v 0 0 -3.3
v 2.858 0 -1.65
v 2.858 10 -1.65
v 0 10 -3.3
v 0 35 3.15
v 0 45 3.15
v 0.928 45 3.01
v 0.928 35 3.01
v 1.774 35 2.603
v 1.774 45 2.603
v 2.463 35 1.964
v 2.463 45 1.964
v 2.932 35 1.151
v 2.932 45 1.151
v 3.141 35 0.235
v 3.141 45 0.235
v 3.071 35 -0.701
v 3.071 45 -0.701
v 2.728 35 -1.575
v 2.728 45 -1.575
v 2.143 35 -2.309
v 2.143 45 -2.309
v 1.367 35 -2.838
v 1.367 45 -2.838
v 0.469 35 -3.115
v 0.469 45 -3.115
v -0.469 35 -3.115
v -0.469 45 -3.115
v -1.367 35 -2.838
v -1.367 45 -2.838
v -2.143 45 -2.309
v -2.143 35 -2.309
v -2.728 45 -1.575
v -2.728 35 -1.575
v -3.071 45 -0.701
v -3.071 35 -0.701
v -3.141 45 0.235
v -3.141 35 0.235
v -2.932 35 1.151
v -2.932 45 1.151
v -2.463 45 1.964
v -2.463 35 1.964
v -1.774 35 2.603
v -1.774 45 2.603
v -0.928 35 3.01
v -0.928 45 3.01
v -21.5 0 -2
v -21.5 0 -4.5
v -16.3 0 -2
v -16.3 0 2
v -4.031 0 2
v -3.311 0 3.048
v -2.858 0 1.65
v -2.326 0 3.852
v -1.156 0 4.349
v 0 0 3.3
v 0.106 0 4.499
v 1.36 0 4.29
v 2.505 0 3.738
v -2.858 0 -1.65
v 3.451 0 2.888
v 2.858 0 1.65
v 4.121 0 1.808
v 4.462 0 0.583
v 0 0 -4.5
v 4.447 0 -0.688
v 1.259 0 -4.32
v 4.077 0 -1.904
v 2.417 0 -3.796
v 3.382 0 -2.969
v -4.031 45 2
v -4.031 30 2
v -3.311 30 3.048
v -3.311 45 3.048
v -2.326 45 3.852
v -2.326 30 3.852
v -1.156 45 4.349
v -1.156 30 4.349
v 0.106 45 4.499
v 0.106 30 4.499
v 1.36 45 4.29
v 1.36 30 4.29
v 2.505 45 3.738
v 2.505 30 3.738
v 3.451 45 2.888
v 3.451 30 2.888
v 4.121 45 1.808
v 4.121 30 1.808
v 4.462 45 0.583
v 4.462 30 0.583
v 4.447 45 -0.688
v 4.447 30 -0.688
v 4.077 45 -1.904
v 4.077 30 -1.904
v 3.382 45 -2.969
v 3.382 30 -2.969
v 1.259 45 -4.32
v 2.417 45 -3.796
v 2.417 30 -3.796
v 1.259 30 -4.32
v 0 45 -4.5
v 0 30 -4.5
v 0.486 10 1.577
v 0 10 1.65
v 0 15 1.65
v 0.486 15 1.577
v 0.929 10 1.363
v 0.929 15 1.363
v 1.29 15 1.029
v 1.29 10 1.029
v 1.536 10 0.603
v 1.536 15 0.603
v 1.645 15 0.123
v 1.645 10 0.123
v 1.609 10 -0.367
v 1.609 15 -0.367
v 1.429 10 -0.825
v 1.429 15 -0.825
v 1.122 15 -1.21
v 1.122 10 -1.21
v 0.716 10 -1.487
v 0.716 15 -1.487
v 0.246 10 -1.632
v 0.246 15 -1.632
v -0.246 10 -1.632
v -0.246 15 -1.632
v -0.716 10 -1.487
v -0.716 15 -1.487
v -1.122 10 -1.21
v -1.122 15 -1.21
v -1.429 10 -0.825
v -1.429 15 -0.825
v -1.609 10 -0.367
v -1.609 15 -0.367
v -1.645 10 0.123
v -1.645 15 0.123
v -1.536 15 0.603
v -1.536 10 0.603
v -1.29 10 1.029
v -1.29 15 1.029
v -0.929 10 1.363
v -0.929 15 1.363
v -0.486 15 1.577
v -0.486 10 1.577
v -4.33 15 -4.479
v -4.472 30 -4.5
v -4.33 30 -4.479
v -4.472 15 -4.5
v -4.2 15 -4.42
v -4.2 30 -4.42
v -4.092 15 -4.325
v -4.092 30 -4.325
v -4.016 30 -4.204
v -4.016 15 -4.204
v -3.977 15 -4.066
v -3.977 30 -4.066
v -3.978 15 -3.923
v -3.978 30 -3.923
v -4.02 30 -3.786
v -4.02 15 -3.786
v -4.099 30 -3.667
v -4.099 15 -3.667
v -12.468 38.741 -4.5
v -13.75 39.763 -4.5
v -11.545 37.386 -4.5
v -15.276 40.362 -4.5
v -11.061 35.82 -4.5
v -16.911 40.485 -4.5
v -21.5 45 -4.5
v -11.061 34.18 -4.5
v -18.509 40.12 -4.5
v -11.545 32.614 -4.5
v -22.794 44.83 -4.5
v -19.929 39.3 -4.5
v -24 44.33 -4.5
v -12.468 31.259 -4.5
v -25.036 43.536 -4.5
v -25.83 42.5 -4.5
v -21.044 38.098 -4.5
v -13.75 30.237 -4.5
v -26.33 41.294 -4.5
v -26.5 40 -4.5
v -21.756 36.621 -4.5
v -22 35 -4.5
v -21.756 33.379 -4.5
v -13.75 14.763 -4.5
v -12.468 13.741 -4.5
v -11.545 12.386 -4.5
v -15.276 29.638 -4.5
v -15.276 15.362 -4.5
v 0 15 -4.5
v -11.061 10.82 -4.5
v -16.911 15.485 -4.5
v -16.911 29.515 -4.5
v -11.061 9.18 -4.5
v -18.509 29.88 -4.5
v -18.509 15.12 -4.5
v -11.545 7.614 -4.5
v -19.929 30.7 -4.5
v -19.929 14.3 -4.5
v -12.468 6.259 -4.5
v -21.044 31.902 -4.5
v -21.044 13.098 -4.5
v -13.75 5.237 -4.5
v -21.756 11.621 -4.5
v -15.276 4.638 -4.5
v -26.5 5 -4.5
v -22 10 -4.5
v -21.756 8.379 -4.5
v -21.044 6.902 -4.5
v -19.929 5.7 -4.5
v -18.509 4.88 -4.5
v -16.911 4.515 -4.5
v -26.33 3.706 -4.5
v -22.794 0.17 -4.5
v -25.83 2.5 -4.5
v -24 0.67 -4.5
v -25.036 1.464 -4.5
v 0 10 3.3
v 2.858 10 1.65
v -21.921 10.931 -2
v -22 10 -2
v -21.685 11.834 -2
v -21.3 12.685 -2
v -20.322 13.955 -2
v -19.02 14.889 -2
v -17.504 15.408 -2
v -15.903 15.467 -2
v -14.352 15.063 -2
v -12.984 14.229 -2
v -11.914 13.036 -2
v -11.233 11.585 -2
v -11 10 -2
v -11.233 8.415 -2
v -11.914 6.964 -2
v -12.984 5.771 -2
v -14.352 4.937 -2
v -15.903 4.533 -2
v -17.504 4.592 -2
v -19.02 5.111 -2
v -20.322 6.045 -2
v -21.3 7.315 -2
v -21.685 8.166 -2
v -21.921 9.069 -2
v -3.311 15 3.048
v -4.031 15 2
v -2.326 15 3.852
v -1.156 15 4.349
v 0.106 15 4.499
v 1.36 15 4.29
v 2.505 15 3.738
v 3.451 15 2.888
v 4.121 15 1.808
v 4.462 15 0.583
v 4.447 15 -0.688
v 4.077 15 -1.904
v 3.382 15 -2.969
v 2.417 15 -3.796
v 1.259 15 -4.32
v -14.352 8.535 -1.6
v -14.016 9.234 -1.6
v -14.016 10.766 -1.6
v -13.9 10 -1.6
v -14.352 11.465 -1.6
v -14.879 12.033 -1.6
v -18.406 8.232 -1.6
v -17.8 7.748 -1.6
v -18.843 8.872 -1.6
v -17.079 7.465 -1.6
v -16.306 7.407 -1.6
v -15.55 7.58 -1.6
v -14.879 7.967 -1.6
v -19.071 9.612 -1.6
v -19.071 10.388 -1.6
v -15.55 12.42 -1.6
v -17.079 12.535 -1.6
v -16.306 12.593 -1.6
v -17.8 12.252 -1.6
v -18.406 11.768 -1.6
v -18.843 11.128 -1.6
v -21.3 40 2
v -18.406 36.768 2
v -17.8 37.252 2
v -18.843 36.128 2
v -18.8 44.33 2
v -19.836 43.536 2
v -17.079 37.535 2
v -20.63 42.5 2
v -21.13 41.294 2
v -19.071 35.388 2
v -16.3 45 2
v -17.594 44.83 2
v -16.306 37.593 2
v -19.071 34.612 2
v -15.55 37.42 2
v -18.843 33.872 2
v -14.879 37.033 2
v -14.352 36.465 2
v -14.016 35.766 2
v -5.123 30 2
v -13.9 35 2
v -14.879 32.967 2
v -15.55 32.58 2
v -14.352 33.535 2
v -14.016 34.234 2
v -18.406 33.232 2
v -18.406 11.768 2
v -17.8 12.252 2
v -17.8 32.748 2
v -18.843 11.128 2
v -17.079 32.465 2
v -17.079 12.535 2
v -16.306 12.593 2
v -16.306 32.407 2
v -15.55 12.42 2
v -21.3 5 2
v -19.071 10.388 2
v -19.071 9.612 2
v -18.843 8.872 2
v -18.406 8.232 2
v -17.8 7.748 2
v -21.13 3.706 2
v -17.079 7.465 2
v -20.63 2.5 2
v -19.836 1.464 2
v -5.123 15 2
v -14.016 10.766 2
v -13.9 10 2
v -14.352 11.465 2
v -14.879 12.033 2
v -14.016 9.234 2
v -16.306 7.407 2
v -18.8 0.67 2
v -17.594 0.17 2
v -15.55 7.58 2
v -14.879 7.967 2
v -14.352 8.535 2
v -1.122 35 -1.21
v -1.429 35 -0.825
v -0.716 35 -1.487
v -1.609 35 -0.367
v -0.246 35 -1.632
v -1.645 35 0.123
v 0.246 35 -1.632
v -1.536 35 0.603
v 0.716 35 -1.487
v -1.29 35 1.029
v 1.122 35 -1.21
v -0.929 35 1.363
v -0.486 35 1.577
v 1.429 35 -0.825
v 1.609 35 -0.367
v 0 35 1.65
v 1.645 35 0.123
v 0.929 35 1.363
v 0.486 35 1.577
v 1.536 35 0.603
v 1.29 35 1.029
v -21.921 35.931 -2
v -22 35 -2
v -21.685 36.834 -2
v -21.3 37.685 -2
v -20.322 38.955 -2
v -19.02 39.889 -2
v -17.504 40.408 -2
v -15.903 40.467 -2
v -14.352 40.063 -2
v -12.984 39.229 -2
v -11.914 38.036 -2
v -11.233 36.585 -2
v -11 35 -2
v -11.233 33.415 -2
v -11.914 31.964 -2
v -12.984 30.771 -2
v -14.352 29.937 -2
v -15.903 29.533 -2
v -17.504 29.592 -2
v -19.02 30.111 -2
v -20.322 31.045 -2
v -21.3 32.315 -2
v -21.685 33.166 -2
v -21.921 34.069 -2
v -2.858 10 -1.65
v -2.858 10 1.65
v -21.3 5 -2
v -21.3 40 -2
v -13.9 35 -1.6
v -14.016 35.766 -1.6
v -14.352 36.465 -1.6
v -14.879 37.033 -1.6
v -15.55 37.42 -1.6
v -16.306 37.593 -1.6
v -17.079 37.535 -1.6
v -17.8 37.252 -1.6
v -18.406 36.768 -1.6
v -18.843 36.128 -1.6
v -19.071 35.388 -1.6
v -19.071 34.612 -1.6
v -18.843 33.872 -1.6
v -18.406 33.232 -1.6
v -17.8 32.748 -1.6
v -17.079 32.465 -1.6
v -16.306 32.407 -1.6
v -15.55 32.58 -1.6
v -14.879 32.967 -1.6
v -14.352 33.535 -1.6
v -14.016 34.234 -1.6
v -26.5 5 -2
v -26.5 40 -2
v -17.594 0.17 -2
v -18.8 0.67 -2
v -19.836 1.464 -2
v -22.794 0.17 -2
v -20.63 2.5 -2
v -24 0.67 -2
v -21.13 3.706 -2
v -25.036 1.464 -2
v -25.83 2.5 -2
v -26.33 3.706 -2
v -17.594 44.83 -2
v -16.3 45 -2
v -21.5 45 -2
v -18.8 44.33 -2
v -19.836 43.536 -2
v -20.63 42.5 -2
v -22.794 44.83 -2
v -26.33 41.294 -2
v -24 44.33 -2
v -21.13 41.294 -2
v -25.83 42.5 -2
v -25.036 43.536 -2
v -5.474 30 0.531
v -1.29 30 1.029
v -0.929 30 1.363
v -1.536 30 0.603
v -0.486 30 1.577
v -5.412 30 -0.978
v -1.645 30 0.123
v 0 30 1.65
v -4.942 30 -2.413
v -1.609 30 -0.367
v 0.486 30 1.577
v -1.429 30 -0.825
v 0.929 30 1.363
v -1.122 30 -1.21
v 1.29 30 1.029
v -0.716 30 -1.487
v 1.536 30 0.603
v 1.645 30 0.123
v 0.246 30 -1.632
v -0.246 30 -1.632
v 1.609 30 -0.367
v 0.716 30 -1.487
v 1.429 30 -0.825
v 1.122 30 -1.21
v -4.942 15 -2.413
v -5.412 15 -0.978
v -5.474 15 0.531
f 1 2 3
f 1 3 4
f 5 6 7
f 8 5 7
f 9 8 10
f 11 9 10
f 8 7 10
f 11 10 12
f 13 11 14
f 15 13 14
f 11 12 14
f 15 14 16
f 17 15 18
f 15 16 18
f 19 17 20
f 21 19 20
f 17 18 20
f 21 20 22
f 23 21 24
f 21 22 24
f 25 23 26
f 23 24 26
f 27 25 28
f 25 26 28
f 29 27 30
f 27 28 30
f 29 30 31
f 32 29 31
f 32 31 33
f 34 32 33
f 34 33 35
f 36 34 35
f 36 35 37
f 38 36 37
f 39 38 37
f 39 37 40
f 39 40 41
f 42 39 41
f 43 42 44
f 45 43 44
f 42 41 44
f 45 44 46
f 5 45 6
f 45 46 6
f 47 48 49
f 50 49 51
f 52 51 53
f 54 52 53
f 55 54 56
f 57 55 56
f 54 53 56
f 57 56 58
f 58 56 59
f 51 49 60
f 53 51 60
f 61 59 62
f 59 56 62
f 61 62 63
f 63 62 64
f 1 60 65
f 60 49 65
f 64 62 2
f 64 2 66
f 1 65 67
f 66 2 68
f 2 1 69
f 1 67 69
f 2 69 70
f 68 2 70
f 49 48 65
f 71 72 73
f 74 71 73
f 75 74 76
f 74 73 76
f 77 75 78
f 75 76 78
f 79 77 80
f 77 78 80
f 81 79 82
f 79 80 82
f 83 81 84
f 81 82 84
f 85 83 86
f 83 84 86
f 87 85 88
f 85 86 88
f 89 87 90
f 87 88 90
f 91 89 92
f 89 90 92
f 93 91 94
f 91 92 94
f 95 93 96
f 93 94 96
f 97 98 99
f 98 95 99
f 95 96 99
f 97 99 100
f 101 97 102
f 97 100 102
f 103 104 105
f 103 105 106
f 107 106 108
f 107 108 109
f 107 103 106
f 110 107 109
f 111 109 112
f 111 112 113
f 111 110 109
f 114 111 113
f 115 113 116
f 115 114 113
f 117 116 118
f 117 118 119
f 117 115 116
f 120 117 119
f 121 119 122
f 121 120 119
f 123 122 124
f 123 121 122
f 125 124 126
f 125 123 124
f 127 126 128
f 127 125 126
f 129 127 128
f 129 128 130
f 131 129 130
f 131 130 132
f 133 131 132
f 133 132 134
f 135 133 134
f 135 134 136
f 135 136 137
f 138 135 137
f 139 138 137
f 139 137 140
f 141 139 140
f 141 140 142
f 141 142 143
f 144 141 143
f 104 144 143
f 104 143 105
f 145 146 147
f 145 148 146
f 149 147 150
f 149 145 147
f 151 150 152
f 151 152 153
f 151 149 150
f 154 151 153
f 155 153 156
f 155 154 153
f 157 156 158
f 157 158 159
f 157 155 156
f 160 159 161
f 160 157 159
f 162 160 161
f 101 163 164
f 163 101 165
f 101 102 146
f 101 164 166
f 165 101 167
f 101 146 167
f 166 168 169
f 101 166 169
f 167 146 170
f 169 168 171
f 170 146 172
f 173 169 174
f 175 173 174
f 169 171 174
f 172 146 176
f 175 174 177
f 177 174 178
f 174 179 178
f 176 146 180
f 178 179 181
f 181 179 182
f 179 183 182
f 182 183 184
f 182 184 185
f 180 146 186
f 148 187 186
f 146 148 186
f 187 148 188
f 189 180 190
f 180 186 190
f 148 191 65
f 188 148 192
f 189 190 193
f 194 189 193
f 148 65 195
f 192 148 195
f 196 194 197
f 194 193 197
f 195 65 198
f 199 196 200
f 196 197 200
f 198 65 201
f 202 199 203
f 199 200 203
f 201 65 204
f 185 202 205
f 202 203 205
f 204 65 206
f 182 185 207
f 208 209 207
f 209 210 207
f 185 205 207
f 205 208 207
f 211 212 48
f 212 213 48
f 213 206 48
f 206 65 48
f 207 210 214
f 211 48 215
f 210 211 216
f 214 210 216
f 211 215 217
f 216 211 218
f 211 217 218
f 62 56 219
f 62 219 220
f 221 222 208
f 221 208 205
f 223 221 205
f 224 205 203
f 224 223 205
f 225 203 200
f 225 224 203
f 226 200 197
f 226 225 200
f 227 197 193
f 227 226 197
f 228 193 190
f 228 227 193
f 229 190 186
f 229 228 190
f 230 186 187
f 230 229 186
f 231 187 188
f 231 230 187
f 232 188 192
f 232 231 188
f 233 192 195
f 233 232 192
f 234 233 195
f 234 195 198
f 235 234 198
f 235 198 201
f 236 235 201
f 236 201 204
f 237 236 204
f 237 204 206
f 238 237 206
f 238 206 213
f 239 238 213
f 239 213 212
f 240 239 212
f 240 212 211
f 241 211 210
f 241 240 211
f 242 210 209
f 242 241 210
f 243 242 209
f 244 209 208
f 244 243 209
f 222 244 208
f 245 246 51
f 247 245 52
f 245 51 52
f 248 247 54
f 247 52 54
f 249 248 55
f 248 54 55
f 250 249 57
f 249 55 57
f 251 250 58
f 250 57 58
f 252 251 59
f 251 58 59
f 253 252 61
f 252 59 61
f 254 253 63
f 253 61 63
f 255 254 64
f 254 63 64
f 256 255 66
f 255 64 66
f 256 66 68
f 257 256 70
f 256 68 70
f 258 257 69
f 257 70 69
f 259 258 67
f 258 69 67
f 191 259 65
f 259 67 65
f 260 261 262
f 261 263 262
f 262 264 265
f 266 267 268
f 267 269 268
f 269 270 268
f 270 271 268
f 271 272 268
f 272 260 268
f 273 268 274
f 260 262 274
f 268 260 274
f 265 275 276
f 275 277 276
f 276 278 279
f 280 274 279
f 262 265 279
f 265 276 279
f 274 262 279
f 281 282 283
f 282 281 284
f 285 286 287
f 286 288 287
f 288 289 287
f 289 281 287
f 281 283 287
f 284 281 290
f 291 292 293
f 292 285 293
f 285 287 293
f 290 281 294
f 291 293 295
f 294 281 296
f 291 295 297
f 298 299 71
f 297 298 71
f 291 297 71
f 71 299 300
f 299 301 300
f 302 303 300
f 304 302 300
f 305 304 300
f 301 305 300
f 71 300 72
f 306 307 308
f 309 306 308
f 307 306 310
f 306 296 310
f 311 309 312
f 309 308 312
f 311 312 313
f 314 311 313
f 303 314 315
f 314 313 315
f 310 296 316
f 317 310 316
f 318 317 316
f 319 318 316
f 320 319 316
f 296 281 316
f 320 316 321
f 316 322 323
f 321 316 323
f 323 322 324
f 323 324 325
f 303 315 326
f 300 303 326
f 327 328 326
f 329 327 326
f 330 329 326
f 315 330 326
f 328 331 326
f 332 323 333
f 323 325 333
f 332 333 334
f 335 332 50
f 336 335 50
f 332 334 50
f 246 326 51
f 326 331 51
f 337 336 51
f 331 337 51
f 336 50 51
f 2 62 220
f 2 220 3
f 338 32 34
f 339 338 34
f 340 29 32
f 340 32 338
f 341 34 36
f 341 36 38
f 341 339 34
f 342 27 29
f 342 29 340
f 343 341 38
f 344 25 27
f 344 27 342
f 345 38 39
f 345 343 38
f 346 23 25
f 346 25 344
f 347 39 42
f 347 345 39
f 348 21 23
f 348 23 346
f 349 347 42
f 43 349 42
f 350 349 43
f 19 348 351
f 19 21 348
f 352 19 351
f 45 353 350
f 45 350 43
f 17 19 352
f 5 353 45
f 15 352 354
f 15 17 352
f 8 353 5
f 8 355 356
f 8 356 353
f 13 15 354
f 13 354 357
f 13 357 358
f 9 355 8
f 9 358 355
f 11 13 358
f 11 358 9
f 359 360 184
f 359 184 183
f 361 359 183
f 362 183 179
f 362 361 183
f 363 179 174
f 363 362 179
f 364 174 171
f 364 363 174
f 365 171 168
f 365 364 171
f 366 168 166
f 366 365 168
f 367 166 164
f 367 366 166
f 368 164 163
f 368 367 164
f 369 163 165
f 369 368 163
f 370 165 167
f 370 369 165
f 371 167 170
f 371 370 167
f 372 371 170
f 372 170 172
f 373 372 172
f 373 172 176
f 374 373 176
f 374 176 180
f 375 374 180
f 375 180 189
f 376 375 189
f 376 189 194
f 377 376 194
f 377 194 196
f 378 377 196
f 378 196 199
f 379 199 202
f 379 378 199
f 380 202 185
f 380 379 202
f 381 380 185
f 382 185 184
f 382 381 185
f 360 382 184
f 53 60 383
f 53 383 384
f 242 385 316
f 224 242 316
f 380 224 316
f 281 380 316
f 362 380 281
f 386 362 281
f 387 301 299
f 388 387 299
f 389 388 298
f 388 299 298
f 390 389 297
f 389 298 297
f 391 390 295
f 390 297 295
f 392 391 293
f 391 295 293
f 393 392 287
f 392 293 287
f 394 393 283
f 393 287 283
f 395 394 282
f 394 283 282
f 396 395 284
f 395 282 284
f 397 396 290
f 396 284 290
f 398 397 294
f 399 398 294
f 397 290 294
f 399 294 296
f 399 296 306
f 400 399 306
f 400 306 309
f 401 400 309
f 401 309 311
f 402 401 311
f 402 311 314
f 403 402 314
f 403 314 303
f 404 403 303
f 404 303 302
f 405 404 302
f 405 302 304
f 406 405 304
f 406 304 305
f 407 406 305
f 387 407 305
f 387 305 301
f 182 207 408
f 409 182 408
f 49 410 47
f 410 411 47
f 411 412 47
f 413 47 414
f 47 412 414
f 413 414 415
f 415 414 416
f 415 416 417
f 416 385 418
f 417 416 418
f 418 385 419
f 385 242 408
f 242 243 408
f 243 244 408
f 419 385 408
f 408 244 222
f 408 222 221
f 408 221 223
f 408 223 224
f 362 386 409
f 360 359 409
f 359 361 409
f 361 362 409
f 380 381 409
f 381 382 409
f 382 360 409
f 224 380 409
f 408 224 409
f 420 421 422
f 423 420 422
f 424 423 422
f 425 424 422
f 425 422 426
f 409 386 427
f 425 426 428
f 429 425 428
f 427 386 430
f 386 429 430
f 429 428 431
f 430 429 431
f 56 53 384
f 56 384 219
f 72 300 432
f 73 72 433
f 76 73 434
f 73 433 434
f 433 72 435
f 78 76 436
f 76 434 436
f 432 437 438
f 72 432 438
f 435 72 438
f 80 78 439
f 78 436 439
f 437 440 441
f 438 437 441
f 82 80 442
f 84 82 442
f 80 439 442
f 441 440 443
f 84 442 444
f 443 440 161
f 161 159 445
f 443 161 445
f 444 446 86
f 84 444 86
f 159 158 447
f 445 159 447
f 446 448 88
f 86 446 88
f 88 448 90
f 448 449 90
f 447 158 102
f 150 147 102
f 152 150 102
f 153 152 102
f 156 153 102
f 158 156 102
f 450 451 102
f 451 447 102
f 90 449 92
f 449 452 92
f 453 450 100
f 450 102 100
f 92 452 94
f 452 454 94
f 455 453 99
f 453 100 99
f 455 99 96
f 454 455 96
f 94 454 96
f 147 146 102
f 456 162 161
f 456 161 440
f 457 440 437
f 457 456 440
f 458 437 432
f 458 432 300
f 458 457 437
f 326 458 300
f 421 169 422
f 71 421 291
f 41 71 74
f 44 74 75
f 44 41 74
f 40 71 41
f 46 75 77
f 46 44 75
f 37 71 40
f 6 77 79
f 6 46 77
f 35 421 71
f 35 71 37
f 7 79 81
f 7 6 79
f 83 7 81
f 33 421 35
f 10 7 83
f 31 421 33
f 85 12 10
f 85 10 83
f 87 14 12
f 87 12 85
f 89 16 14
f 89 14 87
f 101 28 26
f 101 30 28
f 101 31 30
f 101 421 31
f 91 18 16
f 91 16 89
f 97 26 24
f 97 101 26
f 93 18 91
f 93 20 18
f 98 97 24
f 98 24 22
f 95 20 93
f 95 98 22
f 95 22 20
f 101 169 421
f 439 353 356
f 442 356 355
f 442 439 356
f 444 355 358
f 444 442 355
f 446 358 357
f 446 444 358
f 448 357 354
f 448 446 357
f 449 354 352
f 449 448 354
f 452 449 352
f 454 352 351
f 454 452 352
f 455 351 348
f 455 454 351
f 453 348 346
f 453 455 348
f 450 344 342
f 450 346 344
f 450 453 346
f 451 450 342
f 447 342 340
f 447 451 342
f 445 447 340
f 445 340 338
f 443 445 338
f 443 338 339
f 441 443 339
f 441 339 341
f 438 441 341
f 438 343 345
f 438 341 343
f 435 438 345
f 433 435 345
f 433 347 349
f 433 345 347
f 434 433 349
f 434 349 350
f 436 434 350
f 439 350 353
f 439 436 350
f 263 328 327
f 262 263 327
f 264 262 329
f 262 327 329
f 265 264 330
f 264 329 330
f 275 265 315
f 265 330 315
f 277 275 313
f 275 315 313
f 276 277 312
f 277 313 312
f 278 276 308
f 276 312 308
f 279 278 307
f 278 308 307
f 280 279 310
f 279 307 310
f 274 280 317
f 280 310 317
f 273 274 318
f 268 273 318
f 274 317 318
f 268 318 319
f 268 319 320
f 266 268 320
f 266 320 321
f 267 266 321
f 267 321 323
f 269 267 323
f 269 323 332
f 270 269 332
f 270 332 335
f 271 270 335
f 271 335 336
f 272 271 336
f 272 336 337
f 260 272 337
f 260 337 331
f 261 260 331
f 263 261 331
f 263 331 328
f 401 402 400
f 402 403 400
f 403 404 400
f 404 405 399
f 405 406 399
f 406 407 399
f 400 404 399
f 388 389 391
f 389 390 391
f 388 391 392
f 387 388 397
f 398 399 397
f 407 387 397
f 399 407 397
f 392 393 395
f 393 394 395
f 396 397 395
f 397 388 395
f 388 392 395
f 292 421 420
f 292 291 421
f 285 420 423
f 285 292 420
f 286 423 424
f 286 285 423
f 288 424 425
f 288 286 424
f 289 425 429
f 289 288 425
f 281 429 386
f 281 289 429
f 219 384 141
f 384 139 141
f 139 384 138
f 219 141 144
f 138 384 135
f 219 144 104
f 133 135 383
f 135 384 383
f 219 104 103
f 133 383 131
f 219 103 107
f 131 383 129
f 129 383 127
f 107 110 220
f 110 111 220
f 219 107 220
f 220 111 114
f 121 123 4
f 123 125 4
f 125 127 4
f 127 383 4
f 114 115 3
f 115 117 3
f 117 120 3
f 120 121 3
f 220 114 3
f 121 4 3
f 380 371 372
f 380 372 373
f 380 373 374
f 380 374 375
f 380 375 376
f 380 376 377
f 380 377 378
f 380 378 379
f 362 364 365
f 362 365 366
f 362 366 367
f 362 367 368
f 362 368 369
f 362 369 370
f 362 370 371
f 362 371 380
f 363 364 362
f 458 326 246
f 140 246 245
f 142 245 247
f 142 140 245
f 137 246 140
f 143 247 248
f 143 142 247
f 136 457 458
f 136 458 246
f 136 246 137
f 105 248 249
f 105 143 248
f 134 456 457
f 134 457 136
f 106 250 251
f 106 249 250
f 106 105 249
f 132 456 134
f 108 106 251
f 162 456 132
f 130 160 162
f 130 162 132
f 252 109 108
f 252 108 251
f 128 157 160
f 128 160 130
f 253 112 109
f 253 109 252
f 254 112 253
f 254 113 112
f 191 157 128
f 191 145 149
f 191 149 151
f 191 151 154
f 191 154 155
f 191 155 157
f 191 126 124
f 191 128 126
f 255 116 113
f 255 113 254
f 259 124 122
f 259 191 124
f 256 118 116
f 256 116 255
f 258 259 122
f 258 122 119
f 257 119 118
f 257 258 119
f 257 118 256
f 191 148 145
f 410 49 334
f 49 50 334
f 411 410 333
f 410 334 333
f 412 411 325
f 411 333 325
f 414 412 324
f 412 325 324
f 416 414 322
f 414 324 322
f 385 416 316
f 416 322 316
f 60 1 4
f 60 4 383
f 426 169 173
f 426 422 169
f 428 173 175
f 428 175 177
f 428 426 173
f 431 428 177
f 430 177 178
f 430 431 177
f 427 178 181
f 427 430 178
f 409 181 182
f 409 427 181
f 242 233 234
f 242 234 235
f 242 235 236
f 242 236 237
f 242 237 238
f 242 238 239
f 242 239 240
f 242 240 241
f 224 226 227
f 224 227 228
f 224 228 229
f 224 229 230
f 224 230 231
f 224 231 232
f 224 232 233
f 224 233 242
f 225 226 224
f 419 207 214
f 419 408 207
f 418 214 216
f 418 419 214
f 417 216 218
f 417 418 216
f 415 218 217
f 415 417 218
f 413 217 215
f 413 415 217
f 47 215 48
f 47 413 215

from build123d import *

# Parameters (mm, degrees)
BOSS_EXTRUDE1_DEPTH = 45
BOSS_EXTRUDE2_START = 30
SKETCH1_3_R         = 4.5
SKETCH1_3_R_2       = 1.65
BOSS_EXTRUDE2_DEPTH = 15
SKETCH1_4_R         = 4.5
SKETCH1_4_R_2       = 1.65
BOSS_EXTRUDE3_DEPTH = 15
SKETCH5_R           = 5.5
CUT_EXTRUDE1_DEPTH  = 15
SKETCH6_R           = 2.6
CUT_EXTRUDE2_DEPTH  = 15
FILLET1_R           = 0.5
CUT_EXTRUDE3_START  = -2.5
SKETCH7_R           = 5.5
CUT_EXTRUDE3_DEPTH  = 13
SKETCH1_5_R         = 1.65
CUT_EXTRUDE4_DEPTH  = 10
SKETCH9_R           = 3.15
CUT_EXTRUDE5_DEPTH  = 10
SKETCH8_R           = 3.001117943
SKETCH8_R_2         = 3.734433125
BOSS_EXTRUDE5_DEPTH = 0.4
CUT_EXTRUDE6_START  = -2.5
SKETCH10_W          = 5.2
SKETCH10_H          = 45
CUT_EXTRUDE6_DEPTH  = 10
FILLET2_R           = 5


with BuildPart() as part:
    # Sketch1 → Boss-Extrude1 (new body)
    with BuildSketch(Plane(origin=(0, 0, 0), x_dir=(1, 0, 0), z_dir=(0, 1, 0))):
        with BuildLine():
            Line((-26.5, 4.5), (-26.5, -2))
            Line((-26.5, -2), (-4.031128874, -2))
            ThreePointArc((-4.031128874, -2), (-3.824264635, 2.371708245), (0, 4.5))
            Line((0, 4.5), (-26.5, 4.5))
        make_face()
    extrude(amount=BOSS_EXTRUDE1_DEPTH)

    # Sketch1<3> → Boss-Extrude2 (add)
    with BuildSketch(Plane(origin=(0, 0, 0), x_dir=(1, 0, 0), z_dir=(0, 1, 0)).offset(BOSS_EXTRUDE2_START)):
        Circle(SKETCH1_3_R)
        with Locations(Location((0, 0, 0), (0, 0, 270))):
            Circle(SKETCH1_3_R_2, mode=Mode.SUBTRACT)
    extrude(amount=BOSS_EXTRUDE2_DEPTH)

    # Sketch1<4> → Boss-Extrude3 (add)
    # profile 1 of 2: a face of its own
    with BuildSketch(Plane(origin=(0, 0, 0), x_dir=(1, 0, 0), z_dir=(0, 1, 0))):
        Circle(SKETCH1_4_R)
        Polygon((-2.857883832, -1.65), (0, -3.3), (2.857883832, -1.65), (2.857883832, 1.65), (0, 3.3), (-2.857883832, 1.65), align=None, mode=Mode.SUBTRACT)
    # profile 2 of 2: a face of its own
    with BuildSketch(Plane(origin=(0, 0, 0), x_dir=(1, 0, 0), z_dir=(0, 1, 0))):
        Polygon((-2.857883832, 1.65), (-2.857883832, -1.65), (0, -3.3), (2.857883832, -1.65), (2.857883832, 1.65), (0, 3.3), align=None)
        with Locations(Location((0, 0, 0), (0, 0, 270))):
            Circle(SKETCH1_4_R_2, mode=Mode.SUBTRACT)
    extrude(amount=BOSS_EXTRUDE3_DEPTH)

    # Sketch5 → Cut-Extrude1 (cut)
    with BuildSketch(Plane(origin=(0, 15, 0), x_dir=(1, 0, 0), z_dir=(0, 1, 0))):
        Circle(SKETCH5_R)
    extrude(amount=CUT_EXTRUDE1_DEPTH, mode=Mode.SUBTRACT)

    # Sketch6 → Cut-Extrude2 (cut)
    with BuildSketch(Plane.XY.offset(2)):
        with Locations((-16.5, 35)):
            Circle(SKETCH6_R)
        with Locations((-16.5, 10)):
            Circle(SKETCH6_R)
    extrude(amount=-CUT_EXTRUDE2_DEPTH, mode=Mode.SUBTRACT)

    # Fillet1
    fillet1_edges = [part.edges().sort_by_distance(p)[0] for p in [
        (-3.16227766, 22.5, -4.5),
    ]]
    fillet(fillet1_edges, radius=FILLET1_R)

    # Sketch7 → Cut-Extrude3 (cut)
    with BuildSketch(Plane(origin=(0, 0, -4.5), x_dir=(-1, 0, 0), z_dir=(0, 0, -1)).offset(CUT_EXTRUDE3_START)):
        with Locations((16.5, 35)):
            Circle(SKETCH7_R)
        with Locations((16.5, 10)):
            Circle(SKETCH7_R)
    extrude(amount=CUT_EXTRUDE3_DEPTH, mode=Mode.SUBTRACT)

    # Sketch1<5> → Cut-Extrude4 (cut)
    with BuildSketch(Plane(origin=(0, 0, 0), x_dir=(1, 0, 0), z_dir=(0, 1, 0))):
        Polygon((-2.857883832, 1.65), (-2.857883832, -1.65), (0, -3.3), (2.857883832, -1.65), (2.857883832, 1.65), (0, 3.3), align=None)
        with Locations(Location((0, 0, 0), (0, 0, 270))):
            Circle(SKETCH1_5_R, mode=Mode.SUBTRACT)
    extrude(amount=CUT_EXTRUDE4_DEPTH, mode=Mode.SUBTRACT)

    # Sketch9 → Cut-Extrude5 (cut)
    with BuildSketch(Plane(origin=(0, 45, 0), x_dir=(1, 0, 0), z_dir=(0, 1, 0))):
        with Locations(Location((0, 0, 0), (0, 0, 270))):
            Circle(SKETCH9_R)
    extrude(amount=-CUT_EXTRUDE5_DEPTH, mode=Mode.SUBTRACT)

    # Sketch8 → Boss-Extrude5 (add)
    with BuildSketch(Plane(origin=(0, 0, -2), x_dir=(-1, 0, 0), z_dir=(0, 0, -1))):
        with Locations((16.5, 35)):
            Circle(SKETCH8_R)
        with Locations((16.5, 10)):
            Circle(SKETCH8_R_2)
    extrude(amount=-BOSS_EXTRUDE5_DEPTH)

    # Sketch10 → Cut-Extrude6 (cut)
    with BuildSketch(Plane(origin=(0, 0, -4.5), x_dir=(-1, 0, 0), z_dir=(0, 0, -1)).offset(CUT_EXTRUDE6_START)):
        with Locations((23.9, 22.5)):
            Rectangle(SKETCH10_W, SKETCH10_H)
    extrude(amount=-CUT_EXTRUDE6_DEPTH, mode=Mode.SUBTRACT)

    # Fillet2
    fillet2_edges = [part.edges().sort_by_distance(p)[0] for p in [
        (-26.5, 45, -3.25),
        (-21.3, 45, 0),
        (-26.5, 0, -3.25),
        (-21.3, 0, 0),
    ]]
    fillet(fillet2_edges, radius=FILLET2_R)


solid = part.part
